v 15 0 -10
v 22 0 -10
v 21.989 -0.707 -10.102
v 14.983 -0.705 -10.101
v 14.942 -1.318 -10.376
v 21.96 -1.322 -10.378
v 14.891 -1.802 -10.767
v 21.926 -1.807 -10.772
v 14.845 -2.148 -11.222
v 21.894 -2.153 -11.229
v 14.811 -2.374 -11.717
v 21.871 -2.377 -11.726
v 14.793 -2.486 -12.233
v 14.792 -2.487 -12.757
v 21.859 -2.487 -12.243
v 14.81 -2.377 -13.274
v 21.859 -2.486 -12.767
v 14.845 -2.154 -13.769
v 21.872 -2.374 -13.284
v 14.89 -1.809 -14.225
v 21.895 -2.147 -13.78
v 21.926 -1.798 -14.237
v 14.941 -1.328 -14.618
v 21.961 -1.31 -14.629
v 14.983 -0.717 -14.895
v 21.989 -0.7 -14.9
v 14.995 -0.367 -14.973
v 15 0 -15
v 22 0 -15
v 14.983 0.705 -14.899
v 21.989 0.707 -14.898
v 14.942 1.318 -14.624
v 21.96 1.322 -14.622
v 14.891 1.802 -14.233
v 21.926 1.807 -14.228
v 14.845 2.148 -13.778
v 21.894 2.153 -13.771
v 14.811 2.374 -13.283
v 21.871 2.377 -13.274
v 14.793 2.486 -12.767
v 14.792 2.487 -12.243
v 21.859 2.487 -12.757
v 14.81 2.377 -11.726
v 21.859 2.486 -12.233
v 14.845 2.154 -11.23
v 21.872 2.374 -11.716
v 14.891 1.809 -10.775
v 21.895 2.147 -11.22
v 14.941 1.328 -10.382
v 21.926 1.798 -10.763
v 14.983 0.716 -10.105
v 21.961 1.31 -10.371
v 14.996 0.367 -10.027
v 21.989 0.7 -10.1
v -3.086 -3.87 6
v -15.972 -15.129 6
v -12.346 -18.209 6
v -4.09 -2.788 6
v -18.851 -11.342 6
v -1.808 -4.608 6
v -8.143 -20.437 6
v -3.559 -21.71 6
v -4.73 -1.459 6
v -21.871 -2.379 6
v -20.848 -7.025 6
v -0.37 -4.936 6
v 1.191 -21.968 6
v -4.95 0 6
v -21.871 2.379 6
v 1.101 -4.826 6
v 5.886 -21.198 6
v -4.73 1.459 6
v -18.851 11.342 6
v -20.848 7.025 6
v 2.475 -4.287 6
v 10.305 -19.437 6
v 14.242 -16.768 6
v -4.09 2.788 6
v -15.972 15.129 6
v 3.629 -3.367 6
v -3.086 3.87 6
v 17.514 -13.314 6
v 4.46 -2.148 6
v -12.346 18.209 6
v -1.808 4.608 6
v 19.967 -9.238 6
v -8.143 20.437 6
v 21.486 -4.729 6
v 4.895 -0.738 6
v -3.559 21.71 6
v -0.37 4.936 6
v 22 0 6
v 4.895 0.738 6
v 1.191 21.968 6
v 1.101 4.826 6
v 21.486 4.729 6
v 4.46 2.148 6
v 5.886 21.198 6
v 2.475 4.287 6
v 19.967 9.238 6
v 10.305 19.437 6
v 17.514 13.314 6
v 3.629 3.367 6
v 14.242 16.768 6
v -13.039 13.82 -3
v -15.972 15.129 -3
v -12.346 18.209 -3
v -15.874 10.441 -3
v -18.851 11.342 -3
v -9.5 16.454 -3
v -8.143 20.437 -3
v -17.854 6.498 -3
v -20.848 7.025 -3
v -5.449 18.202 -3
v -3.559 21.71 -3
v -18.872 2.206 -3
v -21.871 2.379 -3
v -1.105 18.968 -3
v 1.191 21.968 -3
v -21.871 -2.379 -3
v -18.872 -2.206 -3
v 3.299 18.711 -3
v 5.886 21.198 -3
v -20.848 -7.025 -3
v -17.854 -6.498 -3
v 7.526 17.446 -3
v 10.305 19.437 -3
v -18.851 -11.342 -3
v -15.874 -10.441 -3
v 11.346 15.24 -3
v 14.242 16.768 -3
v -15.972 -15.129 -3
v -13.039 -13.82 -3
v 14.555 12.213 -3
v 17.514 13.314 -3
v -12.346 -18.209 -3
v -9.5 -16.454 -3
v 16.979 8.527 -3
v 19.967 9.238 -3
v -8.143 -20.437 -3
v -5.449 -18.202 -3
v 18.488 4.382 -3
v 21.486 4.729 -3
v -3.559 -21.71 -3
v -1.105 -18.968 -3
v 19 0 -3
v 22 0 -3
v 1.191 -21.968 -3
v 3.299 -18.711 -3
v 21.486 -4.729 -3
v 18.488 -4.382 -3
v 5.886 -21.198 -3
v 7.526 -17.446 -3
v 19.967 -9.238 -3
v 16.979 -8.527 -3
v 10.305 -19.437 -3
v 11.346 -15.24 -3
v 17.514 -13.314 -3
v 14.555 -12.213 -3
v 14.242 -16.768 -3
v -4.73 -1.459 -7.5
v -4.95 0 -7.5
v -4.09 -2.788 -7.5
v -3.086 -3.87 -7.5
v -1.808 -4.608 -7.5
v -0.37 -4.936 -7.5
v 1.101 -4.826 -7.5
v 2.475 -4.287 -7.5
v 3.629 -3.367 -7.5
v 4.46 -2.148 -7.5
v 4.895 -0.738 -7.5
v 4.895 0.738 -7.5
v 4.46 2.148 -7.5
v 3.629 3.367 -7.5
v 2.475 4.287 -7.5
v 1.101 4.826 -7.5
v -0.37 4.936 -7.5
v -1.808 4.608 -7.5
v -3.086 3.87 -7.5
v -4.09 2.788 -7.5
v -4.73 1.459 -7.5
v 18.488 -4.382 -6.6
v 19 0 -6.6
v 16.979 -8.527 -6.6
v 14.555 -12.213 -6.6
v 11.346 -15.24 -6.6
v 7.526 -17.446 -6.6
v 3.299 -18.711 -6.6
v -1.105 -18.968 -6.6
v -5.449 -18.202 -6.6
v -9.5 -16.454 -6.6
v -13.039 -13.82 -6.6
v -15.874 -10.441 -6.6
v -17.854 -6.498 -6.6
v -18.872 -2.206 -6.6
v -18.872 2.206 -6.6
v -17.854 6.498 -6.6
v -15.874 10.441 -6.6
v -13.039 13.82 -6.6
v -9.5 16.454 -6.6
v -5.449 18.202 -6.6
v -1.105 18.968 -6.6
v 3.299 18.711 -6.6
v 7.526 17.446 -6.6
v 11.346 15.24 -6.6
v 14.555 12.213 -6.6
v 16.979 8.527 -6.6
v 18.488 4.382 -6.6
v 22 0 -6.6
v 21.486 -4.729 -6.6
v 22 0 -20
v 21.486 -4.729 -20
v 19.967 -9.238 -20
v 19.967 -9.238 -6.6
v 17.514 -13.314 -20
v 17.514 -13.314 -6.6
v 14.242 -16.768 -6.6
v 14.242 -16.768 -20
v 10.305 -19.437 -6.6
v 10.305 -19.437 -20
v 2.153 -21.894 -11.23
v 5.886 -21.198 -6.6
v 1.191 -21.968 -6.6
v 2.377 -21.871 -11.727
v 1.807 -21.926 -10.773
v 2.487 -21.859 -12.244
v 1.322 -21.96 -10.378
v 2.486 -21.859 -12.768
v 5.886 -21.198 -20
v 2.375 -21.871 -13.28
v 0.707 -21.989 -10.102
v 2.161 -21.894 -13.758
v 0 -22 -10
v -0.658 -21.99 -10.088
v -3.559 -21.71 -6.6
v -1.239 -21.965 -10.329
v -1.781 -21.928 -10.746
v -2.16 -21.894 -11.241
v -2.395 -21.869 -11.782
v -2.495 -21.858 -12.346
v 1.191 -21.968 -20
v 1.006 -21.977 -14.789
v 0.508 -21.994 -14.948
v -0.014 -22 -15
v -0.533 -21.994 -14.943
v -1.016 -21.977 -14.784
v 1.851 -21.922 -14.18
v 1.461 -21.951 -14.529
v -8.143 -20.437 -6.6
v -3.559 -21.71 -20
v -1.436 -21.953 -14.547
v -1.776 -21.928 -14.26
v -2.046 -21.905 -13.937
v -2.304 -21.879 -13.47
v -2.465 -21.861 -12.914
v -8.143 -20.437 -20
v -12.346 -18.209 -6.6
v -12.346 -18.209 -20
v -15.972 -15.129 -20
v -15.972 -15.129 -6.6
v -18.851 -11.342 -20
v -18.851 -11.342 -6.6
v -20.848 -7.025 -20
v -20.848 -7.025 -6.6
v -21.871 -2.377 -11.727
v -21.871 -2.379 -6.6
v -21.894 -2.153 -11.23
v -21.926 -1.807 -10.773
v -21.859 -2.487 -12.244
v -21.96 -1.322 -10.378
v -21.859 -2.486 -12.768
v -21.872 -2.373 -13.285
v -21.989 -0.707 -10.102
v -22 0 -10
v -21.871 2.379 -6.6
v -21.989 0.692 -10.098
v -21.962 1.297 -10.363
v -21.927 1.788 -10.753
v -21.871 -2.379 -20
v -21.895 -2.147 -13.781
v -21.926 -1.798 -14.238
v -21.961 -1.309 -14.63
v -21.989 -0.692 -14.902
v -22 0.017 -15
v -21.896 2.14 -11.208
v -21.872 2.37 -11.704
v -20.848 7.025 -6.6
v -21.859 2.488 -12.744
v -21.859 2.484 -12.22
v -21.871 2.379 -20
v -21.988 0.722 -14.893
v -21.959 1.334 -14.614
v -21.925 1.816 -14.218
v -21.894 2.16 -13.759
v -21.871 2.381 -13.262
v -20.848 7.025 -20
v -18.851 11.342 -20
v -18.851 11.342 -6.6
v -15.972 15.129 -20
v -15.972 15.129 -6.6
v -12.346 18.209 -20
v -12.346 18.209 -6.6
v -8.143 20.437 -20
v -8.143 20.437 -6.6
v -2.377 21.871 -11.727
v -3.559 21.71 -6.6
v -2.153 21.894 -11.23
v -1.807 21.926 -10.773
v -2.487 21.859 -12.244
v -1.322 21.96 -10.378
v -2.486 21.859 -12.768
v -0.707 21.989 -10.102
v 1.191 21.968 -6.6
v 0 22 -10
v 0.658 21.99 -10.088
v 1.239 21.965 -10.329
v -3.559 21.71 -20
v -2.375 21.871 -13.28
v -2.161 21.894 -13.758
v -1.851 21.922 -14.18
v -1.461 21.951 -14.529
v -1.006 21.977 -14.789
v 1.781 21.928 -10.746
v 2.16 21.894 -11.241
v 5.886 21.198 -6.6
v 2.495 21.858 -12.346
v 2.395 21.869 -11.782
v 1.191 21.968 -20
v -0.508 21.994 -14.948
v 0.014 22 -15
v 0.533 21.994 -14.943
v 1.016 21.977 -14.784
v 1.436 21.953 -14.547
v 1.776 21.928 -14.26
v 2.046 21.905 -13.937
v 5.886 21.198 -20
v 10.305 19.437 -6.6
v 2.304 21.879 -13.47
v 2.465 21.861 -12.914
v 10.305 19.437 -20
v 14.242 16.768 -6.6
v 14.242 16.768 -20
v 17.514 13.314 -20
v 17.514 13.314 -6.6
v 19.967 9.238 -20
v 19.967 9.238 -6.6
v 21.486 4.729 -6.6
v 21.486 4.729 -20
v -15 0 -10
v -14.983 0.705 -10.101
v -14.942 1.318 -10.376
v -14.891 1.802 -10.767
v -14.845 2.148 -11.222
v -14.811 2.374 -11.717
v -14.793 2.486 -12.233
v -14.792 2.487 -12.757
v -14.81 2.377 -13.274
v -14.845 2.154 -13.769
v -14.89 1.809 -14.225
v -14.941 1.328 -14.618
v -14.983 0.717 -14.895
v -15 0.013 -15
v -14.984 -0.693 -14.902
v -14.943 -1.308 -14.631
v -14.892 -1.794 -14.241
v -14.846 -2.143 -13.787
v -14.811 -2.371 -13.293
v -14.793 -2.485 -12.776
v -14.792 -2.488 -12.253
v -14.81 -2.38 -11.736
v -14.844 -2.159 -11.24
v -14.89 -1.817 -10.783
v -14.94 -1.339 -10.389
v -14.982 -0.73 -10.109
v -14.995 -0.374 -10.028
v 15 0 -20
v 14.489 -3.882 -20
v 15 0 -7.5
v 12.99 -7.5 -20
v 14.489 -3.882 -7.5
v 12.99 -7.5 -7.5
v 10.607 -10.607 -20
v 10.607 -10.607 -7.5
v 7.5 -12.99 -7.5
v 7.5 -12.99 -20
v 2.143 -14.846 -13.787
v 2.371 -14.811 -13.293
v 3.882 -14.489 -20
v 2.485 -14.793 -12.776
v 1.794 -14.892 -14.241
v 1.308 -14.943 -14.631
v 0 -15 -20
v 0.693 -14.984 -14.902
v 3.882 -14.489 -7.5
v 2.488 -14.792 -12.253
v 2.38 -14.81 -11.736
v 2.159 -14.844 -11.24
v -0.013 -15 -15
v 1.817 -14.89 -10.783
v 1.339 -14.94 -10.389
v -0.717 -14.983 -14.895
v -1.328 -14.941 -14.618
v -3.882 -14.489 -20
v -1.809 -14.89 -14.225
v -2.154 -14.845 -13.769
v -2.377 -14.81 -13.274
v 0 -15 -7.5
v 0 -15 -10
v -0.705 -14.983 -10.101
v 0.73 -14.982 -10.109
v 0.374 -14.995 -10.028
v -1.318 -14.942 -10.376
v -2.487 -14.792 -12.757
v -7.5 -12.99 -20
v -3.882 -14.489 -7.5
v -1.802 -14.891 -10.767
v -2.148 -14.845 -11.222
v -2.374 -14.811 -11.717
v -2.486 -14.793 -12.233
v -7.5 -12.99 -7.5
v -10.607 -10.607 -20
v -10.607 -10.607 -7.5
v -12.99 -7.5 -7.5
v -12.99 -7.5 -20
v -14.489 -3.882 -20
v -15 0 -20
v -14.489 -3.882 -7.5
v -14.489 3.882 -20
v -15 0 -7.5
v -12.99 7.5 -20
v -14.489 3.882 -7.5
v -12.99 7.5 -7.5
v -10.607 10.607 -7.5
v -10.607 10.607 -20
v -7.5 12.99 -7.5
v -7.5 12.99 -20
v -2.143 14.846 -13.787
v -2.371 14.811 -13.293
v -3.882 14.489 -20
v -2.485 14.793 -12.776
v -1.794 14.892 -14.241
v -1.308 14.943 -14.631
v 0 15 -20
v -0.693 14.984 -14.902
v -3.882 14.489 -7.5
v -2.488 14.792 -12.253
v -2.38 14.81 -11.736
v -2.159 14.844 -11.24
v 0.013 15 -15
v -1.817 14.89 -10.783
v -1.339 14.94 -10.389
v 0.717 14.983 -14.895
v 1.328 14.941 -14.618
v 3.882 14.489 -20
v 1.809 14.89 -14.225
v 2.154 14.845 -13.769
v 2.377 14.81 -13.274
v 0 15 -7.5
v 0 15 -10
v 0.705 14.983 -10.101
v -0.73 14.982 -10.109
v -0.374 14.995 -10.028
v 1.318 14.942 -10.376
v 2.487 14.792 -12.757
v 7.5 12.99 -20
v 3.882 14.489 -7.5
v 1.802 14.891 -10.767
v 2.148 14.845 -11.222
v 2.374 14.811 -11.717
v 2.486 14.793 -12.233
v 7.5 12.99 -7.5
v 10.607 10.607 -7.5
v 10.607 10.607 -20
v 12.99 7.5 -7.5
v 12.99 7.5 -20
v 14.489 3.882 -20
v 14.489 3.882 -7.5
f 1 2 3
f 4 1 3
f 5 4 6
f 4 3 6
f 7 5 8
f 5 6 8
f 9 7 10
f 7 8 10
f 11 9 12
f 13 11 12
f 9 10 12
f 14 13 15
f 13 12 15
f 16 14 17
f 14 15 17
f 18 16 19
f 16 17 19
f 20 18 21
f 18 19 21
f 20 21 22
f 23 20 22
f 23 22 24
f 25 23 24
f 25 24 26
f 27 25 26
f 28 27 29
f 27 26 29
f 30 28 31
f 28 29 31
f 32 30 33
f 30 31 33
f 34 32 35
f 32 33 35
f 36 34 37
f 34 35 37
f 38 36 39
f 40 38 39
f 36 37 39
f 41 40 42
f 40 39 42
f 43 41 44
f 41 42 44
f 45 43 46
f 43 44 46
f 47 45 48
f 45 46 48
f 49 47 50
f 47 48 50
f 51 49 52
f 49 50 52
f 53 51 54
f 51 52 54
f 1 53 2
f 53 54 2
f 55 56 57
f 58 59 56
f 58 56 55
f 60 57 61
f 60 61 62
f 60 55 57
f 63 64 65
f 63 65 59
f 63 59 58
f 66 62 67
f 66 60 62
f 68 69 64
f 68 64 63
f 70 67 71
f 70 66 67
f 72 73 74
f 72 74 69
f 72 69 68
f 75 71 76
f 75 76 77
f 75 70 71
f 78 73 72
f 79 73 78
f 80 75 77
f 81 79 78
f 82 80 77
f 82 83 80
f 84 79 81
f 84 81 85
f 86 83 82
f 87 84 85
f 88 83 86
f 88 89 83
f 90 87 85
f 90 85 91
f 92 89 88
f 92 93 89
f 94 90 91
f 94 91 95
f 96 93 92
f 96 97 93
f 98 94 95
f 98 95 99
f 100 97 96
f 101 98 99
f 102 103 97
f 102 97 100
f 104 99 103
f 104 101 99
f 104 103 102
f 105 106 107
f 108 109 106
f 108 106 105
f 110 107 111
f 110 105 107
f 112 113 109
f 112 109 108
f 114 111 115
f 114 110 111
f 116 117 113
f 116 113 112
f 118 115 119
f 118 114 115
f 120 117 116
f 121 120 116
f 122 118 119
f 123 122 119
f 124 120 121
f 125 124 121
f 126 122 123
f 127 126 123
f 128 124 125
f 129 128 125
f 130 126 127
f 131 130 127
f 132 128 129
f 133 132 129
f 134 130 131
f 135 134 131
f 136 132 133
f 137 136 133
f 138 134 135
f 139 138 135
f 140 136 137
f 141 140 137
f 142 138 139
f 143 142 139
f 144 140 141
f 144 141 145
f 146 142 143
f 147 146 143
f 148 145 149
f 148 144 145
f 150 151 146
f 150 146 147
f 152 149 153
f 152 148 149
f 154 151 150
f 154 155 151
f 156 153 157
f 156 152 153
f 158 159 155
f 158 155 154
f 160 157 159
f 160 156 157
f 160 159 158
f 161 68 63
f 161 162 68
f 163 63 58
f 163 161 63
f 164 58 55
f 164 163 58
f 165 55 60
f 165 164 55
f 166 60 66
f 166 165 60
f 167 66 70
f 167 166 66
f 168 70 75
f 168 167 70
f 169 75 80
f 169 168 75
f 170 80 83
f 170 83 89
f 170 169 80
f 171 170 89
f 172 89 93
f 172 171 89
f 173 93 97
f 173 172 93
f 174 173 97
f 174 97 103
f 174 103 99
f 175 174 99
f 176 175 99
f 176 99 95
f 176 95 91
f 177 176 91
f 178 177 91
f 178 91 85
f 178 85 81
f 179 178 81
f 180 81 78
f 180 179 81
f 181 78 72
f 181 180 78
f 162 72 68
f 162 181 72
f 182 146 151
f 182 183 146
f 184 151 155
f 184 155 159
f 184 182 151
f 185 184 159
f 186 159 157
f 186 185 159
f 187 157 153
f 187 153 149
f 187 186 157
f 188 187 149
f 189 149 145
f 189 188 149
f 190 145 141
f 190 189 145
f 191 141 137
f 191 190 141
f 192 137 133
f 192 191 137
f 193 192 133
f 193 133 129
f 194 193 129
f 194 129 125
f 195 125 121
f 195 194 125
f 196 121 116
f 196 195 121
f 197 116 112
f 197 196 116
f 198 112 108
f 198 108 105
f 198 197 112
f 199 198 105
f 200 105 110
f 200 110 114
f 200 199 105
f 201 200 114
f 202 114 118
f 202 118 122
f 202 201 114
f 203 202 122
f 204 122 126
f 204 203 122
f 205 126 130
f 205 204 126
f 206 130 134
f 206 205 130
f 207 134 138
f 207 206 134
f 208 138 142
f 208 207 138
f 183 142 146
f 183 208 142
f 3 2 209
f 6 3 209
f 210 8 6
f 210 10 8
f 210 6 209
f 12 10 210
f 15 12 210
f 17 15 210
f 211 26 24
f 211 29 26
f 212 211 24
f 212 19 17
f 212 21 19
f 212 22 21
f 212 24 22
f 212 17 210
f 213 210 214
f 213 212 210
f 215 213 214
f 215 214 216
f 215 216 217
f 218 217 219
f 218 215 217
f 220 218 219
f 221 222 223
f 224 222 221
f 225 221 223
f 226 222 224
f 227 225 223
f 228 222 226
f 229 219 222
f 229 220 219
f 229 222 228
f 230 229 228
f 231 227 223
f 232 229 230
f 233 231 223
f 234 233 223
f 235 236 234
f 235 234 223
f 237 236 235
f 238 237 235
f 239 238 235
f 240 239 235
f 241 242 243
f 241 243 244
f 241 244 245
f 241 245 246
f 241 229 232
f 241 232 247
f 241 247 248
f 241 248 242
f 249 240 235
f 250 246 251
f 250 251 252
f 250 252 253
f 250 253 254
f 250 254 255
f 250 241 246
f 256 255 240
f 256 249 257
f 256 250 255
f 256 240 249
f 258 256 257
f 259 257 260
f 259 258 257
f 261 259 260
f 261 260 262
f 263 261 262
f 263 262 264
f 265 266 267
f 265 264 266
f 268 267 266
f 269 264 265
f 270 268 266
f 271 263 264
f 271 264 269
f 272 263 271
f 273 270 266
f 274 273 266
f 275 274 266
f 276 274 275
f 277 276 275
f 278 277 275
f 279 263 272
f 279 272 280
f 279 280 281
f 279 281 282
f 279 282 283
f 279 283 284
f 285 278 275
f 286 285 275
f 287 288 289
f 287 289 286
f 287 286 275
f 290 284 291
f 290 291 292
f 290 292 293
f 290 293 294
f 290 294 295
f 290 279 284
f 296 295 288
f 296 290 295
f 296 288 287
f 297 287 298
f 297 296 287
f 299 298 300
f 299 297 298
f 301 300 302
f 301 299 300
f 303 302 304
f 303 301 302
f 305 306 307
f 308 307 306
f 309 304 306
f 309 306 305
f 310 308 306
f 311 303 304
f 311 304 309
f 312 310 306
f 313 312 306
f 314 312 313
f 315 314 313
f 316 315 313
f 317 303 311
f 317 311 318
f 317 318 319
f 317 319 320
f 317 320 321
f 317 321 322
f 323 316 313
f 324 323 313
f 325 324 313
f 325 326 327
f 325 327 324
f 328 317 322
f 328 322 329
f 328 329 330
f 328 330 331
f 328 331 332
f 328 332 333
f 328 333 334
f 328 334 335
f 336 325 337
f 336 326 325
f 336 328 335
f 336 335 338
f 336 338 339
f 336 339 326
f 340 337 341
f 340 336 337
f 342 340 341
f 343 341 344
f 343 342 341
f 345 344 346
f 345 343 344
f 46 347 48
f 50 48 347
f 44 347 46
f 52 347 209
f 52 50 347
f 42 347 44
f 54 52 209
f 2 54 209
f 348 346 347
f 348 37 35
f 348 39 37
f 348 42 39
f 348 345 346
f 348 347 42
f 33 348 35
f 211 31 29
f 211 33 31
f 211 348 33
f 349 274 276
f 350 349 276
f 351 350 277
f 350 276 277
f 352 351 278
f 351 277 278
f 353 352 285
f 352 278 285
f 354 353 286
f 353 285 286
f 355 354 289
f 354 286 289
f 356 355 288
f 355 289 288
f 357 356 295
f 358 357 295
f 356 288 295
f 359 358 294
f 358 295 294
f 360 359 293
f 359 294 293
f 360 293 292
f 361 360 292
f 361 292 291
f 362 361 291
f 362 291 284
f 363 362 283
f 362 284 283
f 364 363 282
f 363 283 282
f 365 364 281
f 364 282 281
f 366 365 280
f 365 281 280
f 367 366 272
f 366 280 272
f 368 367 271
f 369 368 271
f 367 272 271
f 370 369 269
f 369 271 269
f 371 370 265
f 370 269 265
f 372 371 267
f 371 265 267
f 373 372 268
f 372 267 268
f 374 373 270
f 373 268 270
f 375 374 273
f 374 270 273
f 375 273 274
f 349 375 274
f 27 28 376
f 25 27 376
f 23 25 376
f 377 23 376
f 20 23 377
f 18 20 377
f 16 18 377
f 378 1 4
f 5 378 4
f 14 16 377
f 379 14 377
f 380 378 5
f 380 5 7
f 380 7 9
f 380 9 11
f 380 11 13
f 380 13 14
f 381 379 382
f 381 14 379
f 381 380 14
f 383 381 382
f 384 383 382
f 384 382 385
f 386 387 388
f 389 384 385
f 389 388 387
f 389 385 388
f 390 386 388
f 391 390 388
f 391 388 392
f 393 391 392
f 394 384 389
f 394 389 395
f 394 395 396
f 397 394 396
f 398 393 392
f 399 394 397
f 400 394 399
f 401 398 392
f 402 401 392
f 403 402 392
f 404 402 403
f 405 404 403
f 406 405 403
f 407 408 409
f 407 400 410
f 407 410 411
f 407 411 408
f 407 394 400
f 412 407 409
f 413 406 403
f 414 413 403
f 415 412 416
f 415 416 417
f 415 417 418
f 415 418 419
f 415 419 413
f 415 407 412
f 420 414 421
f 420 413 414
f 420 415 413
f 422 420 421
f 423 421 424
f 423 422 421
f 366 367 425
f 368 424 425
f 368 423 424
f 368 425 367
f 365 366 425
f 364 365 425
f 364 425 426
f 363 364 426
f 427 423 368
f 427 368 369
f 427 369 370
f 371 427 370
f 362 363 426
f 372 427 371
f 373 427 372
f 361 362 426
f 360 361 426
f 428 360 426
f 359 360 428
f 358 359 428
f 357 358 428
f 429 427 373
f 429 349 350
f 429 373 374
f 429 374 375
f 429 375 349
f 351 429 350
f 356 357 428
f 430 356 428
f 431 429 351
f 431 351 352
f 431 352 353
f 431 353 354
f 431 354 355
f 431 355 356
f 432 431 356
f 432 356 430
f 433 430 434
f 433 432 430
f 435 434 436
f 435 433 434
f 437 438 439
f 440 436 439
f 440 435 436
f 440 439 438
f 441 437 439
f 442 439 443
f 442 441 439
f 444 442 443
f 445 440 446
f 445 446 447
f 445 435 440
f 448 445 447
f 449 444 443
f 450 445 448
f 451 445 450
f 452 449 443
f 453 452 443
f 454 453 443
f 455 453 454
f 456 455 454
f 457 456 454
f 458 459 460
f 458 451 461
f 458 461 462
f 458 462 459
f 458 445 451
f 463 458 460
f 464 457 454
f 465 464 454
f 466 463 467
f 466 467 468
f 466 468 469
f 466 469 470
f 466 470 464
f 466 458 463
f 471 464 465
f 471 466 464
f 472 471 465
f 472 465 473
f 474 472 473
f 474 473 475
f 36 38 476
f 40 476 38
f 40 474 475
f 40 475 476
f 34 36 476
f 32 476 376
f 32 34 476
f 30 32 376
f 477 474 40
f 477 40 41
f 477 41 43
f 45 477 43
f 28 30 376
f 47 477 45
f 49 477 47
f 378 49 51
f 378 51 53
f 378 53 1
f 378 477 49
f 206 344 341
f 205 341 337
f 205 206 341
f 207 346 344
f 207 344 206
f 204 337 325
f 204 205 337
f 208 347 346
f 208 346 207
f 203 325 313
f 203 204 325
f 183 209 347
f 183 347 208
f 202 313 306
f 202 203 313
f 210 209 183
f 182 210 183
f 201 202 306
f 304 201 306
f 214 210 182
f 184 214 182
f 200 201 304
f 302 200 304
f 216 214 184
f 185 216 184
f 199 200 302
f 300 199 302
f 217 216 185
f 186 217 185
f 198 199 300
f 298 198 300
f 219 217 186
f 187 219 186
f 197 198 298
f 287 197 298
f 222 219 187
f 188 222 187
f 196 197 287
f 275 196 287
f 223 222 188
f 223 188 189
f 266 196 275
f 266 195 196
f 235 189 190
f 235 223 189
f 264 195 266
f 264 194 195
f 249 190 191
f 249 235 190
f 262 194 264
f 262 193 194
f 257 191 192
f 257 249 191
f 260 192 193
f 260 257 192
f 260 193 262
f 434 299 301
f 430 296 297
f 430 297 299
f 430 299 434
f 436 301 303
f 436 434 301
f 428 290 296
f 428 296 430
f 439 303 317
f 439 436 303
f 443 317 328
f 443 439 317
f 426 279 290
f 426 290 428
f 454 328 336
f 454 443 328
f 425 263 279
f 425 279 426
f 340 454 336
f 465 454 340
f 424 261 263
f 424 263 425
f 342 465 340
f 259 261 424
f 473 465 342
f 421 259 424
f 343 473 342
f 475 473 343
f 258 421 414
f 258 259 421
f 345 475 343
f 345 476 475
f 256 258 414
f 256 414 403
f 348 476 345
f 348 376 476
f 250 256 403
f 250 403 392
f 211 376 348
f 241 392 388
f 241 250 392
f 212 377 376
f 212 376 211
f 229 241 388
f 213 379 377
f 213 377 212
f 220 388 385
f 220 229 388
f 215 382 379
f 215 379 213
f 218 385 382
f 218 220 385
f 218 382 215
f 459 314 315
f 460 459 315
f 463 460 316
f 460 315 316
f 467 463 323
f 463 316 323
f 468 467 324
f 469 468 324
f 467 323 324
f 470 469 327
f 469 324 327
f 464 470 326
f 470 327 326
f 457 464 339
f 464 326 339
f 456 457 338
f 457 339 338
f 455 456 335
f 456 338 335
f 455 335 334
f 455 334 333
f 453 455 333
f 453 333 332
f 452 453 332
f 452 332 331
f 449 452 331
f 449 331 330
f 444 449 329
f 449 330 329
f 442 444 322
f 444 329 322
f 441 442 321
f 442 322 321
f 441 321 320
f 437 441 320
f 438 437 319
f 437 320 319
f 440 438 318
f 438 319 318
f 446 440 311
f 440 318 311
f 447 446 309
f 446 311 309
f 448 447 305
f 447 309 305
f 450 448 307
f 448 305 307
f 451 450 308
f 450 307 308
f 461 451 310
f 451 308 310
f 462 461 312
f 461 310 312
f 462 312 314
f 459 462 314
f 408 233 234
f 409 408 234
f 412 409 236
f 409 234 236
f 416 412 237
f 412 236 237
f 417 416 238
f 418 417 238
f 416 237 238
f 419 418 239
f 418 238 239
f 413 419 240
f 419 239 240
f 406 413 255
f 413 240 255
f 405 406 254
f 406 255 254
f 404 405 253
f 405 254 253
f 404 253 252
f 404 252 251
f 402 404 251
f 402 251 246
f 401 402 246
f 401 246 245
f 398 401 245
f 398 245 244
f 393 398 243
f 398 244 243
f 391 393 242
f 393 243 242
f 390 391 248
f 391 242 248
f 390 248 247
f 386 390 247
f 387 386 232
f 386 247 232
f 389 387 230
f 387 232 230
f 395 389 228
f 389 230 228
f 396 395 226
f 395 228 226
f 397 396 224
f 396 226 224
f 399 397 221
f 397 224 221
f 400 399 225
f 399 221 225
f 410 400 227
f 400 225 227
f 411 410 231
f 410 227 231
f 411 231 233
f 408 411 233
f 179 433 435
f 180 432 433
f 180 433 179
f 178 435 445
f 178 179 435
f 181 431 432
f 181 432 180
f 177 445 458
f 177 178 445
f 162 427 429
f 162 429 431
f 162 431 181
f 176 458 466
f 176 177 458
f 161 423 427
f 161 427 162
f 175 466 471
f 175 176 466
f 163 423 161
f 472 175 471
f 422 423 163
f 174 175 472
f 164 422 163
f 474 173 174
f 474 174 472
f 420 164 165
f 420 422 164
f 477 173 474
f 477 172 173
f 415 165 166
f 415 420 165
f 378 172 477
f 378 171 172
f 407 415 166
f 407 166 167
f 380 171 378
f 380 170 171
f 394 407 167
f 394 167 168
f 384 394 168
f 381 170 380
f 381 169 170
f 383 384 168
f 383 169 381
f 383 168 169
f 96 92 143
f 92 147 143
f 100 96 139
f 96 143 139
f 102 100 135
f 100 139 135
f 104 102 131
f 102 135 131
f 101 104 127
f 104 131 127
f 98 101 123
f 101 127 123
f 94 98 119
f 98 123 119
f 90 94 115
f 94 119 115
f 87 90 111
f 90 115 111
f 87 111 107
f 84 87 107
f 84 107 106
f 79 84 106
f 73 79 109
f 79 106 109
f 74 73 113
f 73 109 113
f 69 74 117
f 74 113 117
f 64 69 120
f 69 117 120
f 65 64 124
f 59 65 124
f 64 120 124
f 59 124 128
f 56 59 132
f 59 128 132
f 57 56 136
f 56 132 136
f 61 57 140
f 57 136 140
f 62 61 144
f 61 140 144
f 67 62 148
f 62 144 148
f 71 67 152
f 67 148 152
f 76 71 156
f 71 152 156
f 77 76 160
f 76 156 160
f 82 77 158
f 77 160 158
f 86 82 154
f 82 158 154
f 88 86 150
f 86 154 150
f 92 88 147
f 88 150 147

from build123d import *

# Parameters (mm, degrees)
CORTE_EXTRUS_O1_REACH      = 55.104
CORTE_EXTRUS_O1_END_RADIUS = 15
ESBO_O3_R                  = 2.5
PADR_OCIRCULAR1_COUNT      = 4
CORTE_EXTRUS_O2_REACH      = 35.53
ESBO_O5_R                  = 4.95
ESBO_O6_R                  = 22
ESBO_O6_R_2                = 4.95
RESSALTO_EXTRUS_O1_DEPTH   = 6


with BuildPart() as part:
    # Esbo_o1 → Revolu_o1 (revolve)
    with BuildSketch(Plane(origin=(0, 0, 0), x_dir=(1, 0, 0), z_dir=(0, 1, 0)), mode=Mode.PRIVATE) as revolu_o1_sk:
        Polygon((0, 0), (-22, 0), (-22, 3), (-19, 3), (-19, 6.6), (-22, 6.6), (-22, 20), (-15, 20), (-15, 7.5), (0, 7.5), align=None)
    revolve(revolu_o1_sk.sketch.rotate(Axis((0, 0, 0), (0, 0, -1)), 180), axis=Axis((0, 0, 0), (0, 0, -1)))

    # Corte-extrus_o1: up to this cylinder (the profile starts outside it)
    corte_extrus_o1_end = Plane(origin=(0, 0, -12.5), z_dir=(0, 0, 1)) * Cylinder(CORTE_EXTRUS_O1_END_RADIUS, 141.208, mode=Mode.PRIVATE)
    # Esbo_o3 → Corte-extrus_o1 (cut, up to the surface)
    with BuildSketch(Plane.ZY.offset(22), mode=Mode.PRIVATE) as corte_extrus_o1_sk1:
        with Locations((-12.5, 0)):
            Circle(ESBO_O3_R)
    corte_extrus_o1_tool1 = extrude(corte_extrus_o1_sk1.sketch, amount=-CORTE_EXTRUS_O1_REACH, mode=Mode.PRIVATE) - corte_extrus_o1_end
    corte_extrus_o1 = corte_extrus_o1_tool1.solids().sort_by_distance((-22, 0, -12.5))[0]
    add(corte_extrus_o1, mode=Mode.SUBTRACT)

    # Padr_oCircular1: Corte-extrus_o1 ×4 about axis
    padr_ocircular1_axis = Axis((0, 0, -20), (0, 0, 1))
    for i in range(1, PADR_OCIRCULAR1_COUNT):
        add(corte_extrus_o1.rotate(padr_ocircular1_axis, i * 360 / PADR_OCIRCULAR1_COUNT), mode=Mode.SUBTRACT)

    # Esbo_o5 → Corte-extrus_o2 (cut, up to next)
    with BuildSketch(Plane(origin=(0, 0, -7.5), x_dir=(-1, 0, 0), z_dir=(0, 0, -1)), mode=Mode.PRIVATE) as corte_extrus_o2_sk1:
        Circle(ESBO_O5_R)
    corte_extrus_o2_tool1 = extrude(corte_extrus_o2_sk1.sketch, amount=-CORTE_EXTRUS_O2_REACH, mode=Mode.PRIVATE) & part.part
    add(corte_extrus_o2_tool1.solids().sort_by_distance((0, 0, -7.5))[0], mode=Mode.SUBTRACT)

    # Esbo_o6 → Ressalto-extrus_o1 (add)
    with BuildSketch(Plane.XY):
        Circle(ESBO_O6_R)
        with Locations(Location((0, 0, 0), (0, 0, 180))):
            Circle(ESBO_O6_R_2, mode=Mode.SUBTRACT)
    extrude(amount=RESSALTO_EXTRUS_O1_DEPTH)


solid = part.part
